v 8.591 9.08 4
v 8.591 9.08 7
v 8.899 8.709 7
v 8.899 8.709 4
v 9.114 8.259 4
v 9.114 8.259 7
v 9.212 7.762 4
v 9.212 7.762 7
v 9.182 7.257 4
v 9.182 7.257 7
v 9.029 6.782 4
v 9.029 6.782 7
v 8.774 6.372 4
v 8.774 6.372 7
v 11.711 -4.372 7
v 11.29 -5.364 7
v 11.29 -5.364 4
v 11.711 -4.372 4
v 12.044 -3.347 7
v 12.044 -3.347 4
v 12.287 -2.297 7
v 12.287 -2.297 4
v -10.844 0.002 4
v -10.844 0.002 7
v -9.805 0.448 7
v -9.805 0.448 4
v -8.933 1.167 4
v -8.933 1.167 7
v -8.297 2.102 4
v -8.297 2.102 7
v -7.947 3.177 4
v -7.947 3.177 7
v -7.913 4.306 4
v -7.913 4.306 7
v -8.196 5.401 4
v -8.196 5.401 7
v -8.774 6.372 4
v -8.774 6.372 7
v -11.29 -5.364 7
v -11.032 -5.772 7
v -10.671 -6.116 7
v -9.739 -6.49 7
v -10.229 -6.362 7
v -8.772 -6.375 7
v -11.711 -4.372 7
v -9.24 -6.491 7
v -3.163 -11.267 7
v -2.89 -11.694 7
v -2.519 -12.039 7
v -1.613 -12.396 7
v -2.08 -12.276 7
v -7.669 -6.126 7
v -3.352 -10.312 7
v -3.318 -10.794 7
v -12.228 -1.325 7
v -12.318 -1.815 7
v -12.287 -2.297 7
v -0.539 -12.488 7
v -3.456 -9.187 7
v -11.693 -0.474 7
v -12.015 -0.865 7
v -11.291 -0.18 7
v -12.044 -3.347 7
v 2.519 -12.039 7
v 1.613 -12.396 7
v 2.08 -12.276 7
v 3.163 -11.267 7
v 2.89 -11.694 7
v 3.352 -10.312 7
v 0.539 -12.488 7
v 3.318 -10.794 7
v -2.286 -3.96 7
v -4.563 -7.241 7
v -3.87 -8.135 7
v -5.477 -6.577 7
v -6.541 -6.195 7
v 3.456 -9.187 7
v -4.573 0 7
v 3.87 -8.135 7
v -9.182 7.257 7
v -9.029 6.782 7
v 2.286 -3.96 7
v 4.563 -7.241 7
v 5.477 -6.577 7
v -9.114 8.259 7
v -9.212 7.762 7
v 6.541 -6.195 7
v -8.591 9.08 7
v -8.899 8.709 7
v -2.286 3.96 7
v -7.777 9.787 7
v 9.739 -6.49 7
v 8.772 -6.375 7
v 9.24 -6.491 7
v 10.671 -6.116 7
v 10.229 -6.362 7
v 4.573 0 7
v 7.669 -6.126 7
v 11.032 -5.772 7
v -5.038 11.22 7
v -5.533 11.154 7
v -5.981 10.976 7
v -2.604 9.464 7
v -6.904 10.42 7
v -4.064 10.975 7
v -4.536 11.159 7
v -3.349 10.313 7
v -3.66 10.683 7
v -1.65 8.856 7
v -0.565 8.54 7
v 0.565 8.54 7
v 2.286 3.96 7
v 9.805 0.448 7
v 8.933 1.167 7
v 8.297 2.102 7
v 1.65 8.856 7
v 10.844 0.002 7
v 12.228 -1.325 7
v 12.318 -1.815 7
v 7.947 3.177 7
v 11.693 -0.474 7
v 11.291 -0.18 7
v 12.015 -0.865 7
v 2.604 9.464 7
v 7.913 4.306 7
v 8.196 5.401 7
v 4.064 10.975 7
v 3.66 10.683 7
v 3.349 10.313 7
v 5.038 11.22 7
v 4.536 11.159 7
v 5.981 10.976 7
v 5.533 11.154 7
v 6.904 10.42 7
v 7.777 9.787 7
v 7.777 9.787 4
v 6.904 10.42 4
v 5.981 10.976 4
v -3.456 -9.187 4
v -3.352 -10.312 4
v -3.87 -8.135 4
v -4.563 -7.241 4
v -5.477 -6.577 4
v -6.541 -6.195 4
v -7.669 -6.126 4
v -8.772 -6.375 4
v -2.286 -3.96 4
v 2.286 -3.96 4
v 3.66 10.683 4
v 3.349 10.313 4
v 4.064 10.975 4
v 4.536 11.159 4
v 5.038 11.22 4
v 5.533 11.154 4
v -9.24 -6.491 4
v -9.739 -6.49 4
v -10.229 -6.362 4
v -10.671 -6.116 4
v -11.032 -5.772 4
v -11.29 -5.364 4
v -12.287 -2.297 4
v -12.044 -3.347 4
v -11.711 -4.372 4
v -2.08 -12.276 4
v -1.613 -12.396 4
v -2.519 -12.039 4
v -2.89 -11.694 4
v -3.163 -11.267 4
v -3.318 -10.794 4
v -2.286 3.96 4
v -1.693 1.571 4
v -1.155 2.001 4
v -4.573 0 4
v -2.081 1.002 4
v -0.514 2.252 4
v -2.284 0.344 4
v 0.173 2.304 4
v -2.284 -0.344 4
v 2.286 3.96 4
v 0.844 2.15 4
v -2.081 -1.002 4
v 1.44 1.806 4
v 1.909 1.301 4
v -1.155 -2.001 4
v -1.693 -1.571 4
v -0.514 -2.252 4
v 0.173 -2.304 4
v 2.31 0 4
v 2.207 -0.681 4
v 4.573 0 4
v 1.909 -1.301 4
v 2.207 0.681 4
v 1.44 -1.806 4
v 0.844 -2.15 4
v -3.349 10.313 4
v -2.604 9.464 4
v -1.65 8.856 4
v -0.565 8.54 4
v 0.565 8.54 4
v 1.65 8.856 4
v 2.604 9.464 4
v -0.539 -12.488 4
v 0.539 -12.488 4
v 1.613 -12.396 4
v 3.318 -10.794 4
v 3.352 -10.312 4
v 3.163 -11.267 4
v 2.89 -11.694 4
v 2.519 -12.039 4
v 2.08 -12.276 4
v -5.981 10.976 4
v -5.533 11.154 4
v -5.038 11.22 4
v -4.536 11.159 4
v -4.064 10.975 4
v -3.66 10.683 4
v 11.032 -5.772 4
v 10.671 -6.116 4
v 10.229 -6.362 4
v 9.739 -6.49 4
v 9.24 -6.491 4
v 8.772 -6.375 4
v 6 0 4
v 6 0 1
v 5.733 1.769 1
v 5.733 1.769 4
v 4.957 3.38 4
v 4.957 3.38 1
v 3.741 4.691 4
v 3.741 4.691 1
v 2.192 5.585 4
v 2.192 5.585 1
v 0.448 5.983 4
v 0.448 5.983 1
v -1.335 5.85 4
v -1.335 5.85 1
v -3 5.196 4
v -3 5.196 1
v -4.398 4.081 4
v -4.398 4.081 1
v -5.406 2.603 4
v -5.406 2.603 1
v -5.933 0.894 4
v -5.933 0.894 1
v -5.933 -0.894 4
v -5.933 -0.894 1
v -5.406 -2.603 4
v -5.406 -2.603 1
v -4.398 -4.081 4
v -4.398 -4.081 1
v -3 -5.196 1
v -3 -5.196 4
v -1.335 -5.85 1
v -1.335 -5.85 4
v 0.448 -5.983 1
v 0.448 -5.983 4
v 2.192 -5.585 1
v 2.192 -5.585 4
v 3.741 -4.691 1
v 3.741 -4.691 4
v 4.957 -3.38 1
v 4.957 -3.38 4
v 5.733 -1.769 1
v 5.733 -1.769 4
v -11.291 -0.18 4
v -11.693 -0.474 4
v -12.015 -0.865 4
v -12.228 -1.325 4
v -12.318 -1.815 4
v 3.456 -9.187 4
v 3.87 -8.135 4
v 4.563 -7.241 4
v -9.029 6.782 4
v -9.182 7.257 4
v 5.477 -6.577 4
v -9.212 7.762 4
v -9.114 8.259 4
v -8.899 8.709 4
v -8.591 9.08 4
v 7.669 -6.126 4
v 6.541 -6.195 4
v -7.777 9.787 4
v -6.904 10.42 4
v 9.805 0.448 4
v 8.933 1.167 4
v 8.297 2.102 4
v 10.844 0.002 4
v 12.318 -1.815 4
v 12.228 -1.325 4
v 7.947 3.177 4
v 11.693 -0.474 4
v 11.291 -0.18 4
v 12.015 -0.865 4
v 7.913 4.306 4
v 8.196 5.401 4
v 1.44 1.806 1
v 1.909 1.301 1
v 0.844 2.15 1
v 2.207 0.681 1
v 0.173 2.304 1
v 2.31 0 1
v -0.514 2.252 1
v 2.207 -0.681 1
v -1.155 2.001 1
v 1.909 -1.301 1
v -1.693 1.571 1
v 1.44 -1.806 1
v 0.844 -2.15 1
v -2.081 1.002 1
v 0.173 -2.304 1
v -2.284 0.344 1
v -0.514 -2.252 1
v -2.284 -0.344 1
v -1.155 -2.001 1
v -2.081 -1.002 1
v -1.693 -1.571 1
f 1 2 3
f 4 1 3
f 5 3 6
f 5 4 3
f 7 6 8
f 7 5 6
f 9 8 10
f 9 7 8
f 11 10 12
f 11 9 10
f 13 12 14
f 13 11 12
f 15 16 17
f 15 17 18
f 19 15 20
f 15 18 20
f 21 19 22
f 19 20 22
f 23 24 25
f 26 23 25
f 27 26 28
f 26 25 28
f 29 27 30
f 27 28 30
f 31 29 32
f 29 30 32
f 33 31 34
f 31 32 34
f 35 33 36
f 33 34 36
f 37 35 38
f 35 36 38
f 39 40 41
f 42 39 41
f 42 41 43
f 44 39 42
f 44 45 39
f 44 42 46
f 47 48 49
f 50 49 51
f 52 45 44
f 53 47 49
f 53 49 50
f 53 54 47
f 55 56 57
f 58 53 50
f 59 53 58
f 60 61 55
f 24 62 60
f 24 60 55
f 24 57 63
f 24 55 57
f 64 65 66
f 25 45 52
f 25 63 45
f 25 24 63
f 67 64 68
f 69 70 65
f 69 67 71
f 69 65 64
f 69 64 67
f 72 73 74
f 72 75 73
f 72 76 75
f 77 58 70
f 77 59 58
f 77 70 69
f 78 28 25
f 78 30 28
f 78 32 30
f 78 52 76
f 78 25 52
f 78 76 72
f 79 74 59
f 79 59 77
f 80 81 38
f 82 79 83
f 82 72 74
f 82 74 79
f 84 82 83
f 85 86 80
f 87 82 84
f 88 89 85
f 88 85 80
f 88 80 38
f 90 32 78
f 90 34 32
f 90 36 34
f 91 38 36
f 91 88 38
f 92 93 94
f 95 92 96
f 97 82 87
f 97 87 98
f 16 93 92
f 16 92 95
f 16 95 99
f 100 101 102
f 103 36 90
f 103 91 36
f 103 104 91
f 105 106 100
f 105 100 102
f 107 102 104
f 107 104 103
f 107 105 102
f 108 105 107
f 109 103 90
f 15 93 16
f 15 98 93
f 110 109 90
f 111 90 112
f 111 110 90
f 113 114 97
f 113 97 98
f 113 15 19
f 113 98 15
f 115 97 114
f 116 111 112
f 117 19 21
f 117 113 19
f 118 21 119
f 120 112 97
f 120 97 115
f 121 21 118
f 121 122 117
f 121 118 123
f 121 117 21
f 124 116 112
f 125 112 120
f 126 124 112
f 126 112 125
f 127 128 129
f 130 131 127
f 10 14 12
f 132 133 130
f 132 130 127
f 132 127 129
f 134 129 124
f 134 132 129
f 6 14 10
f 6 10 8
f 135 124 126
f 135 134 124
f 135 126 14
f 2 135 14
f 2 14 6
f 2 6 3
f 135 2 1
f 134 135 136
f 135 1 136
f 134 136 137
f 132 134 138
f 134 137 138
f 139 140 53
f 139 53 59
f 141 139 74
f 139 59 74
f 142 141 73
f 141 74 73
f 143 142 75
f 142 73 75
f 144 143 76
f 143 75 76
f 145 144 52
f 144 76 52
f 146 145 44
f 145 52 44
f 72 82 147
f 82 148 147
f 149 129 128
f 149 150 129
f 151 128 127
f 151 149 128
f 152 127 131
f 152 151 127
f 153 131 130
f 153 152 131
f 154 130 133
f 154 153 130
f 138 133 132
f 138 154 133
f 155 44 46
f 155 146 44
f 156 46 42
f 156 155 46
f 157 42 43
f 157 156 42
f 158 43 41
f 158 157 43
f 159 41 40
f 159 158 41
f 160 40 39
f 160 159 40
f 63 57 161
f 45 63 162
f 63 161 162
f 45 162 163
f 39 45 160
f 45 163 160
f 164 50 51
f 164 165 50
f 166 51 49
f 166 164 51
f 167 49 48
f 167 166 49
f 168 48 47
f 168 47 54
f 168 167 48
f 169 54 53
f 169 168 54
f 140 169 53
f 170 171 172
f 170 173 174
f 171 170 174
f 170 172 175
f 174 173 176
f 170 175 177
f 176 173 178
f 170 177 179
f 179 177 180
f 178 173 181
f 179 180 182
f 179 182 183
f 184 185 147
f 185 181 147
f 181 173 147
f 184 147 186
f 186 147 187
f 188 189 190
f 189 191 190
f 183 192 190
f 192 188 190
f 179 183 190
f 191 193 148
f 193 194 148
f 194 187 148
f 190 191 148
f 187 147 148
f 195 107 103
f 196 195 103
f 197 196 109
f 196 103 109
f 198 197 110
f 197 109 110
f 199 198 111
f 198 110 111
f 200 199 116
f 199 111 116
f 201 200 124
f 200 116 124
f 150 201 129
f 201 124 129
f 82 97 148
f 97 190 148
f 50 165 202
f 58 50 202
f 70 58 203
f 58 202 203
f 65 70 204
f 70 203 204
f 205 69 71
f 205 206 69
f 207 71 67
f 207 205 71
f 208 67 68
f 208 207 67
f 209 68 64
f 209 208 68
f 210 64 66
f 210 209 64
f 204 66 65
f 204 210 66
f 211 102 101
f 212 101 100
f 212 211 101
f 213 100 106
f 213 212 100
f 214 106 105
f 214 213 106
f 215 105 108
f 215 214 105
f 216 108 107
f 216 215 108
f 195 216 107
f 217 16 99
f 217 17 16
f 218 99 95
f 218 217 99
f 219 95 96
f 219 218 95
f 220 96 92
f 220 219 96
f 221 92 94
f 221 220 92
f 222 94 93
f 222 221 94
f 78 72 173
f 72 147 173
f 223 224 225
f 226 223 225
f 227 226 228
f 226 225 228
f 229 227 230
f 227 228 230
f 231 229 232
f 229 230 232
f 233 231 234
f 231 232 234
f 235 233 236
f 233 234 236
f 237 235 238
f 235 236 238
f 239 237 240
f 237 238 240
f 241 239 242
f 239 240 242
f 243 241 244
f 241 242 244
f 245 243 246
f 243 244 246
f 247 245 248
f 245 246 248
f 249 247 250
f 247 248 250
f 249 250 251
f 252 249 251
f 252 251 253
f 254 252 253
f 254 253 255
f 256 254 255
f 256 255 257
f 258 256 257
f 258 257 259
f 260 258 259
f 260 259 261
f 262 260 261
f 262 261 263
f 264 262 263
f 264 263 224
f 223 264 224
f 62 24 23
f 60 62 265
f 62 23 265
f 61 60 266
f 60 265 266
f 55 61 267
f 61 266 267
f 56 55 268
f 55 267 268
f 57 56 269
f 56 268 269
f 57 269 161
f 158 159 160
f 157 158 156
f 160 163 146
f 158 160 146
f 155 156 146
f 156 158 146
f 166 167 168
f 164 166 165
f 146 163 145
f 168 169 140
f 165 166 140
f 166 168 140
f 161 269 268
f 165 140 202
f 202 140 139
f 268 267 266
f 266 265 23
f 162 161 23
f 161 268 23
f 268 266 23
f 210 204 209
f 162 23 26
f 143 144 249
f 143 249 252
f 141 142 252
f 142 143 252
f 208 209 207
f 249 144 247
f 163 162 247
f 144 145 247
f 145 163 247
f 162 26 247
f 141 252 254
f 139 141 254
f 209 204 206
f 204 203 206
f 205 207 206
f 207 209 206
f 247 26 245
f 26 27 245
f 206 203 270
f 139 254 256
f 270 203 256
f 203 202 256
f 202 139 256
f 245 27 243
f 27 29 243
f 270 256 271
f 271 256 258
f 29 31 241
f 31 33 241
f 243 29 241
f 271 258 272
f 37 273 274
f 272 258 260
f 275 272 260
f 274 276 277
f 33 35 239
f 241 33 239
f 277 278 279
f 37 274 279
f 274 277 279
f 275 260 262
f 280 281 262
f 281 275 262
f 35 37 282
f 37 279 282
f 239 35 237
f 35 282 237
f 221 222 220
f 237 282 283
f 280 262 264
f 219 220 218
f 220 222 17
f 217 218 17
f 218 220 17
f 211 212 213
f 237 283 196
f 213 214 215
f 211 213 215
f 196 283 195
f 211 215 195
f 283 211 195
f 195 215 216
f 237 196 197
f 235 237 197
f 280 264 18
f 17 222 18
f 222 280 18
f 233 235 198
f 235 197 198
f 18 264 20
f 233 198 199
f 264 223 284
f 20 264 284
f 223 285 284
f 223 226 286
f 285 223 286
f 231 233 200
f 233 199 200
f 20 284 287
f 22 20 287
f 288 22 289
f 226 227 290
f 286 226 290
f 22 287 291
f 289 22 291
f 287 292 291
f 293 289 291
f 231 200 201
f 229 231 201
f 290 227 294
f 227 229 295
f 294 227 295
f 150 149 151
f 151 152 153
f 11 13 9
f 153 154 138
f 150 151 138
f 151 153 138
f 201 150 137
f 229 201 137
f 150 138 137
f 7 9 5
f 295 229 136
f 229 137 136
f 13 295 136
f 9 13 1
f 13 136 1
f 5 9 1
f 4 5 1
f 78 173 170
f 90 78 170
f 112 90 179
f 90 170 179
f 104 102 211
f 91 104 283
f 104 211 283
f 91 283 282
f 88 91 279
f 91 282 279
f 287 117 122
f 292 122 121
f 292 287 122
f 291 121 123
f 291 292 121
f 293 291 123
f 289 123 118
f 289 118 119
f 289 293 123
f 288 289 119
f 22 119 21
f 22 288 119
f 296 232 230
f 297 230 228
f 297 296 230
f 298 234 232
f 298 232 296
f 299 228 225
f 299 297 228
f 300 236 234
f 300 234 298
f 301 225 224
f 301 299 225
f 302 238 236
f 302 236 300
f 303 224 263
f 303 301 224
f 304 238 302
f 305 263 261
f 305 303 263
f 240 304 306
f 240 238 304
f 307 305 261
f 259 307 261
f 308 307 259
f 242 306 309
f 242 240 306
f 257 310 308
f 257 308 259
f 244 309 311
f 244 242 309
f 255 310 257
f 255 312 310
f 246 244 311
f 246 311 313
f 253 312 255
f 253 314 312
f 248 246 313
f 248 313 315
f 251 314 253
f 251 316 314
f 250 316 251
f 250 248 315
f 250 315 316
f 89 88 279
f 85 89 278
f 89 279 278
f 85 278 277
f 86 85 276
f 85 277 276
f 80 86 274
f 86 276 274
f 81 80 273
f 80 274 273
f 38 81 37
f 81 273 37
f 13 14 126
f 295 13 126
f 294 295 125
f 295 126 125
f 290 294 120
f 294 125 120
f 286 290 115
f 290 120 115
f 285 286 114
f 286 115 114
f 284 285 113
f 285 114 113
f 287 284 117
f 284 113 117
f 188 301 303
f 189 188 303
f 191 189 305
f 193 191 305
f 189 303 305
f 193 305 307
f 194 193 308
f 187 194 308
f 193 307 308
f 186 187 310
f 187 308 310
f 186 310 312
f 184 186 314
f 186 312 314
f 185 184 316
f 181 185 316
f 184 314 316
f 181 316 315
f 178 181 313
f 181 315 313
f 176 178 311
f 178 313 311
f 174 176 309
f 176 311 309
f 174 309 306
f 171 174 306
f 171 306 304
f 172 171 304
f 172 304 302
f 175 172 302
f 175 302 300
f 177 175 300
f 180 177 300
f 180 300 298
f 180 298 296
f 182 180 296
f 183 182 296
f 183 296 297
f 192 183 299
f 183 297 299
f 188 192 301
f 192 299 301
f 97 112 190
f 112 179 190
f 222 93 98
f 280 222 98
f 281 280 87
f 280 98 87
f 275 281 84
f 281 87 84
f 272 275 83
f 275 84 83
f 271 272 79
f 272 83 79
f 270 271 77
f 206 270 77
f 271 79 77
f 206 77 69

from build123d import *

# Parameters (mm, degrees)
SKETCH_R           = 6
PAD_DEPTH          = 4
SKETCH001_R        = 12.5
PAD001_DEPTH       = 3
SKETCH002_R        = 4
POCKET_DEPTH       = 3
POLARPATTERN_COUNT = 5
FILLET_R           = 2
SKETCH003_R        = 2.31
POCKET001_DEPTH    = 3
POCKET001_FACE25_R = 6
POCKET002_DEPTH    = 1
POCKET002_FACE26_R = 2.31
POCKET003_DEPTH    = 1.5
POCKET003_FACE26_R = 2.31
POCKET004_DEPTH    = 1.501
SKETCH005_R        = 6
SKETCH005_R_2      = 2.31
PAD002_DEPTH       = 3


with BuildPart() as part:
    # Sketch → Pad (new body)
    with BuildSketch(Plane.XY):
        Circle(SKETCH_R)
        Polygon((-2.286307, -3.96), (2.286307, -3.96), (4.572614, 0), (2.286307, 3.96), (-2.286307, 3.96), (-4.572614, 0), align=None, mode=Mode.SUBTRACT)
    extrude(amount=PAD_DEPTH)

    # Sketch001 (on Face9 of Pad) → Pad001 (join)
    with BuildSketch(Plane.XY.offset(4)):
        Circle(SKETCH001_R)
    extrude(amount=PAD001_DEPTH)

    # Sketch002 (on Face3 of Pad001) → Pocket (cut)
    with BuildSketch(Plane.XY.offset(7)):
        with Locations((0, 12.5)):
            Circle(SKETCH002_R)
    pocket = extrude(amount=-POCKET_DEPTH, mode=Mode.SUBTRACT)

    # PolarPattern: Pocket ×5 about axis
    polarpattern_axis = Axis((0, 0, 0), (0, 0, 1))
    for i in range(1, POLARPATTERN_COUNT):
        add(pocket.rotate(polarpattern_axis, i * 360 / POLARPATTERN_COUNT), mode=Mode.SUBTRACT)

    # Fillet
    fillet_edges = [part.edges().sort_by_distance(p)[0] for p in [
        (-12.499674, -0.090275, 5.5),
        (-10.059387, 7.420158, 5.5),
        (-3.948468, 11.86, 5.5),
        (3.948468, 11.86, 5.5),
        (-3.776755, -11.915793, 5.5),
        (-10.165511, -7.27409, 5.5),
        (10.165511, -7.27409, 5.5),
        (3.776755, -11.915793, 5.5),
        (10.059387, 7.420158, 5.5),
        (12.499674, -0.090275, 5.5),
    ]]
    fillet(fillet_edges, radius=FILLET_R)

    # Sketch003 (on Face31 of Fillet) → Pocket001 (cut)
    with BuildSketch(Plane(origin=(0, 0, 4), x_dir=(1, 0, 0), z_dir=(0, 0, -1))):
        Circle(SKETCH003_R)
    extrude(amount=-POCKET001_DEPTH, mode=Mode.SUBTRACT)

    # Pocket001 Face25 → Pocket002 (cut)
    with BuildSketch(Plane(origin=(0, 0, 0), x_dir=(0, -1, 0), z_dir=(0, 0, -1))):
        Circle(POCKET001_FACE25_R)
        Polygon((0, 4.572614), (3.96, 2.286307), (3.96, -2.286307), (0, -4.572614), (-3.96, -2.286307), (-3.96, 2.286307), align=None, mode=Mode.SUBTRACT)
    extrude(amount=-POCKET002_DEPTH, mode=Mode.SUBTRACT)

    # Pocket002 Face26 → Pocket003 (cut)
    with BuildSketch(Plane(origin=(0, 0, 4), x_dir=(0, -1, 0), z_dir=(0, 0, -1))):
        Polygon((0, 4.572614), (-3.96, 2.286307), (-3.96, -2.286307), (0, -4.572614), (3.96, -2.286307), (3.96, 2.286307), align=None)
        Circle(POCKET002_FACE26_R, mode=Mode.SUBTRACT)
    extrude(amount=-POCKET003_DEPTH, mode=Mode.SUBTRACT)

    # Pocket003 Face26 → Pocket004 (cut, through all)
    with BuildSketch(Plane(origin=(0, 0, 5.5), x_dir=(0, -1, 0), z_dir=(0, 0, -1))):
        Polygon((0, 4.572614), (-3.96, 2.286307), (-3.96, -2.286307), (0, -4.572614), (3.96, -2.286307), (3.96, 2.286307), align=None)
        Circle(POCKET003_FACE26_R, mode=Mode.SUBTRACT)
    extrude(amount=-POCKET004_DEPTH, mode=Mode.SUBTRACT)

    # Sketch005 (on Face30 of Pocket004) → Pad002 (join)
    with BuildSketch(Plane(origin=(0, 0, 1), x_dir=(1, 0, 0), z_dir=(0, 0, -1))):
        Circle(SKETCH005_R)
        Circle(SKETCH005_R_2, mode=Mode.SUBTRACT)
    extrude(amount=-PAD002_DEPTH)


solid = part.part
